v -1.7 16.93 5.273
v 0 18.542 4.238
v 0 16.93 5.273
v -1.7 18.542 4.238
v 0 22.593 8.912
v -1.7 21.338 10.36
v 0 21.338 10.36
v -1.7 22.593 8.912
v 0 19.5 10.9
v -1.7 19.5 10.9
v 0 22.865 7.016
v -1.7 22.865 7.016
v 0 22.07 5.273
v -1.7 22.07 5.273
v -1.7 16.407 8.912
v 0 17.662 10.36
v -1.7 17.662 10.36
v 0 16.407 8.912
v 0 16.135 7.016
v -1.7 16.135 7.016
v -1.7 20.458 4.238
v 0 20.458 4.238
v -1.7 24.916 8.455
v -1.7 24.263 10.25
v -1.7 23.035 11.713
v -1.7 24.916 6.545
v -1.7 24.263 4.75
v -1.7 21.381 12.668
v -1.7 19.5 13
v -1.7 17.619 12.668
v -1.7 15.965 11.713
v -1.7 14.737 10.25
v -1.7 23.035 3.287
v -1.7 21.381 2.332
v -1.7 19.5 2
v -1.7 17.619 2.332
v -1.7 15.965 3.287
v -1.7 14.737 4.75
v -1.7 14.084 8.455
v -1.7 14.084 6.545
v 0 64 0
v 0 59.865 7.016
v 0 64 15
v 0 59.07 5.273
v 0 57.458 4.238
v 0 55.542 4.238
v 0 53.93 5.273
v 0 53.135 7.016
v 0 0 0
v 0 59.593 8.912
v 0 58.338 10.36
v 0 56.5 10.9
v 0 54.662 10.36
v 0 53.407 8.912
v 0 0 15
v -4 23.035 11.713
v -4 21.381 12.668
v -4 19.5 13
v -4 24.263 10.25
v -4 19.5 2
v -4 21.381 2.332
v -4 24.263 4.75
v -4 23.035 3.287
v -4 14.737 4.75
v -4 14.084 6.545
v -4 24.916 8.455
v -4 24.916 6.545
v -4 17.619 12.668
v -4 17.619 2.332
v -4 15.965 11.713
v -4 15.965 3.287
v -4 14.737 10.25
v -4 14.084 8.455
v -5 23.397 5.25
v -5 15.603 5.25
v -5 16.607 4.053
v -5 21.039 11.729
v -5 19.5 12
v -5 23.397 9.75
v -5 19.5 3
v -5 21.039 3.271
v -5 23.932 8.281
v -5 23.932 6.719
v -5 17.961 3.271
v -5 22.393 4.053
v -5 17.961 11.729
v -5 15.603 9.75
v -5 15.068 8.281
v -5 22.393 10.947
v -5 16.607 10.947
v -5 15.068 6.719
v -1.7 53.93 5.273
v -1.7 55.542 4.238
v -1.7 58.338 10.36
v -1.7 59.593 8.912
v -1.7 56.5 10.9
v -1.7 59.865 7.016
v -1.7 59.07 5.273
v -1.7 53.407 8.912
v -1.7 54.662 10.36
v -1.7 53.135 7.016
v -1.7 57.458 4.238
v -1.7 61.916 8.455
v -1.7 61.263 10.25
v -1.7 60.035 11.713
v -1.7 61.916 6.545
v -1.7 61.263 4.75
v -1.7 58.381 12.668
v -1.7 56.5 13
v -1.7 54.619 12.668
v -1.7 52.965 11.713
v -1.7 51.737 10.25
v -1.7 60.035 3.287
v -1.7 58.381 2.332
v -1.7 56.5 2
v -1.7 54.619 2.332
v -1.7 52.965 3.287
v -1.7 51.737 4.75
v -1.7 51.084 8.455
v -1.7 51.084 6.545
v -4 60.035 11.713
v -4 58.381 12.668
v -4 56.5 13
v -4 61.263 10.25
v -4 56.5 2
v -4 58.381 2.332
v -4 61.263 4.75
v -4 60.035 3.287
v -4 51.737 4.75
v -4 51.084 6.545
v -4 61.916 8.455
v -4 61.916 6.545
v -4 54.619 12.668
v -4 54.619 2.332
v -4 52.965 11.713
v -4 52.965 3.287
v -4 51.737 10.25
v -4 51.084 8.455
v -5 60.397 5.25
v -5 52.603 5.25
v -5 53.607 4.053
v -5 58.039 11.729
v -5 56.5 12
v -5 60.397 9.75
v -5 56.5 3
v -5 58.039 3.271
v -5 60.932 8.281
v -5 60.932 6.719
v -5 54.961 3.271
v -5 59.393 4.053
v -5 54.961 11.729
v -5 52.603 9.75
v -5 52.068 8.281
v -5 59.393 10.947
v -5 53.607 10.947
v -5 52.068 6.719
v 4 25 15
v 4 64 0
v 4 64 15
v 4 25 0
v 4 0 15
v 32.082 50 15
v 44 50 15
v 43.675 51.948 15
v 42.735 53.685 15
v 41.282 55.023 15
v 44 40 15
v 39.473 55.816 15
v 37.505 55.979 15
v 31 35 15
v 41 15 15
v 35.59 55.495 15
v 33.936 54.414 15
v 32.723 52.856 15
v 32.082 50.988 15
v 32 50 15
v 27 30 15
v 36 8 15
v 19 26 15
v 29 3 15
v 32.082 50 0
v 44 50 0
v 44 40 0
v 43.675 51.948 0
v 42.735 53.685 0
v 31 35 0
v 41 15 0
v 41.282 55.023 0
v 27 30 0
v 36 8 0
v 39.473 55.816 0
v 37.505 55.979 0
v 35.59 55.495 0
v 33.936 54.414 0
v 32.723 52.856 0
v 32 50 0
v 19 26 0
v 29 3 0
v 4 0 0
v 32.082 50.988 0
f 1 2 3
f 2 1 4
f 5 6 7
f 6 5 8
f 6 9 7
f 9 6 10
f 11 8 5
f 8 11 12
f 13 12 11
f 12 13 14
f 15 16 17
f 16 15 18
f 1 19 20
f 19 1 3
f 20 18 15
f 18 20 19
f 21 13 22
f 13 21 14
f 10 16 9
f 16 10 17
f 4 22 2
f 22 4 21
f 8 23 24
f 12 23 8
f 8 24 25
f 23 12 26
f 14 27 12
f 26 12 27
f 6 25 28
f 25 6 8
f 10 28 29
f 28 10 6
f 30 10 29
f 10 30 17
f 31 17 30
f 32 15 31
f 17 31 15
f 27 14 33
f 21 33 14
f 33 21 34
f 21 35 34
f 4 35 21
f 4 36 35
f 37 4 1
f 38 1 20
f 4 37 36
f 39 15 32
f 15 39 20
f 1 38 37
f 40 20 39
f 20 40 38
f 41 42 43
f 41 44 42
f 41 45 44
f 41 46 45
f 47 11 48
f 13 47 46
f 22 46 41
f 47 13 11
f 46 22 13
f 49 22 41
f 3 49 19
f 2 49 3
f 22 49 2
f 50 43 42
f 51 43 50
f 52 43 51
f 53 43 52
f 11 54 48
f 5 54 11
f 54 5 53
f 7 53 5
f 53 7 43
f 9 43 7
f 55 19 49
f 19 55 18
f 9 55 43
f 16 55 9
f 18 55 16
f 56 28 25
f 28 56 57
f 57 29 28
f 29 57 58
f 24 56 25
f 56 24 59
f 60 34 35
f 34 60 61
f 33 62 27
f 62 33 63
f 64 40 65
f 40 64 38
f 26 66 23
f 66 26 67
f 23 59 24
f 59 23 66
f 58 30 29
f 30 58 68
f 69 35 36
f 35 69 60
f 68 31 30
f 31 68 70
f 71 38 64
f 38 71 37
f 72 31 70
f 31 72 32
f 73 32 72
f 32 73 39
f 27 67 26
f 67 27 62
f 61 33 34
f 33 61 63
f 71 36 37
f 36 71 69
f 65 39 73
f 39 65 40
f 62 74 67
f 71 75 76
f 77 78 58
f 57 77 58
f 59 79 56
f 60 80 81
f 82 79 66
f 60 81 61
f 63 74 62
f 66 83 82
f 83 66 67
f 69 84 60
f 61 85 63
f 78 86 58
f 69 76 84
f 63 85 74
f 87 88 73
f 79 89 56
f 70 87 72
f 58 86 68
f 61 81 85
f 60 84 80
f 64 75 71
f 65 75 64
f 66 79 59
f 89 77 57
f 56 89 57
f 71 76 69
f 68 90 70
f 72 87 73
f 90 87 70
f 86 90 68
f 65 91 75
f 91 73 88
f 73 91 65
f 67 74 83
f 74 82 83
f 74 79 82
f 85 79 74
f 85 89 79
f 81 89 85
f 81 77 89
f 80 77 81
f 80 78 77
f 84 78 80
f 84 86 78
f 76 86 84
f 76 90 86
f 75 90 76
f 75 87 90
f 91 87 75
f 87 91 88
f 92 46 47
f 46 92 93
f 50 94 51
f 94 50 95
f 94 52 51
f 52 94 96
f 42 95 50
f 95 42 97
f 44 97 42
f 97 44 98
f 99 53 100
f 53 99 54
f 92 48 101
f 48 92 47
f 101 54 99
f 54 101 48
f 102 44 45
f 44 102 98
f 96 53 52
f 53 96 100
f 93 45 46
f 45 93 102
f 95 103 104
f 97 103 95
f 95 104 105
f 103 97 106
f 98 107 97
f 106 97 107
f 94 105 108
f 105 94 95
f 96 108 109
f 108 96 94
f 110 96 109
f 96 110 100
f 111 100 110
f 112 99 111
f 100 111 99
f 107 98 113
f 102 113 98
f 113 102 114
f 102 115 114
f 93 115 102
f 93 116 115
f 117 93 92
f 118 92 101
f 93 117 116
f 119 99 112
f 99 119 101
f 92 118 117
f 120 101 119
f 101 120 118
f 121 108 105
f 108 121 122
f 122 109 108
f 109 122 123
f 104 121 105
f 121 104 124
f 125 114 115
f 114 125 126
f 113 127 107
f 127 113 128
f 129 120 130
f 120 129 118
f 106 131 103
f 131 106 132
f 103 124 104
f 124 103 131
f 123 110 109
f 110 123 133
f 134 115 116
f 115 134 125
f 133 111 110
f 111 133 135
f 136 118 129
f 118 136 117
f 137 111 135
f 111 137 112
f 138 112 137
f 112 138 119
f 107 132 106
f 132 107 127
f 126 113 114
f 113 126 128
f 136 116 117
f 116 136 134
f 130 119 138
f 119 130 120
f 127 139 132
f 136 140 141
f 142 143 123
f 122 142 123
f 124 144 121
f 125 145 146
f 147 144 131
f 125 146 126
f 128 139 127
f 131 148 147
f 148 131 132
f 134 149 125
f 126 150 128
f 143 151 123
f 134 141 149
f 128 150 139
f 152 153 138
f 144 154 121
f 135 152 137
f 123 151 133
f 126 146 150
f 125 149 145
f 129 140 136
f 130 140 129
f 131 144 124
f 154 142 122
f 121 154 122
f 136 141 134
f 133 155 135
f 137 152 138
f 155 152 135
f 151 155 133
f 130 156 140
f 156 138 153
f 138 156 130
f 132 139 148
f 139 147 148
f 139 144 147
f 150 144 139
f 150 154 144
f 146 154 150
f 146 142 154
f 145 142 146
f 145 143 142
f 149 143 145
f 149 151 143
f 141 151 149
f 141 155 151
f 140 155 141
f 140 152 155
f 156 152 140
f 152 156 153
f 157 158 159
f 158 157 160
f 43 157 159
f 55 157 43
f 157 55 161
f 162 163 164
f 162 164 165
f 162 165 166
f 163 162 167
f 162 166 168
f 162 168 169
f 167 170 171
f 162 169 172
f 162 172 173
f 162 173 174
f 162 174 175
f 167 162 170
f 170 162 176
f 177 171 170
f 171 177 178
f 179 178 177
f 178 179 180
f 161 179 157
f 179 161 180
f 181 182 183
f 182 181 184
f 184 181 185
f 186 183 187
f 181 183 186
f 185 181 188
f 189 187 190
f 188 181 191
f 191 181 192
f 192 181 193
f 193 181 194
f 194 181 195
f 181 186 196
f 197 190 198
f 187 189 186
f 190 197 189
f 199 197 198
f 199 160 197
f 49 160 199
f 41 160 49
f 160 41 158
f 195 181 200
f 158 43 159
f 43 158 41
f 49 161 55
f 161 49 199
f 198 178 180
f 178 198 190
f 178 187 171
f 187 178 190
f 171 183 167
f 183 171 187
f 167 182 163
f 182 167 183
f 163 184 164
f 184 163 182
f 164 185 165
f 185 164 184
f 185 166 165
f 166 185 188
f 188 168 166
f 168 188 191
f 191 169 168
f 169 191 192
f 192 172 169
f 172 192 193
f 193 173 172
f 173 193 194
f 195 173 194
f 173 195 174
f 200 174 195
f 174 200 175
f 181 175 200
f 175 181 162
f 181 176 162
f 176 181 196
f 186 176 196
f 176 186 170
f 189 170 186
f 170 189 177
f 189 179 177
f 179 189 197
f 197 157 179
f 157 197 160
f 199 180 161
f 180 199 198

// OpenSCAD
// Hooks for garage shelving
// by sabertail@physicsdog.org
//
// The failure mode I've observed is the "mushrooms" that lock into the
// shelving breaking off. They and the rest of the "mount" should be printed
// with 100% infill for maximum strength. The print should have the top of
// the "mushrooms" perpendicular to the layers, so they don't delaminate off.
// This means they will need supports.


width_back = 15;
thick_back = 4;
height_back = 64;


module mushroom() {
  h_total = 5;
  h_cap = 3.3;
  h_base = h_total - h_cap;
  
  d_cap = 11;
  d_base = 6.8;
  
  h_bevel = 1;
  r_bevel = 2;
  
  h_cap_unbeveled = h_cap - h_bevel;
  
  cylinder(d=d_base, h=h_base, center=false);
  translate([0,0,h_base])
    cylinder(d=d_cap, h=h_cap_unbeveled, center=false);
  translate([0,0,h_base + h_cap_unbeveled])
    cylinder(d1=d_cap, d2=d_cap - r_bevel, h=h_bevel, center=false);
};


module mount() {
  cube([thick_back, height_back, width_back]);

  n_mushroom = 2;
  mushroom_spacing = 37;
  extra_offset = 6;
  mushroom_offset = 0.5*(height_back - (n_mushroom-1)*mushroom_spacing) + extra_offset;
  for(i = [0:1:(n_mushroom-1)]) {
    translate([0, mushroom_offset + i*mushroom_spacing, 0.5*width_back]) rotate([0,-90,0]) mushroom();
  }
};


module hook() {
  points = [
    [ 0,  0],
    [25,  3],
    [32,  8],
    [37, 15],
    [40, 40],
    [40, 50],
    [28, 50],
    [27, 35],
    [23, 30],
    [15, 26],
    [ 0, 25],
    [ 0,  0],
  ];
  i_top_out = 5;
  i_top_in = 6;
  top_center = 0.5*(points[i_top_out] + points[i_top_in]);
  top_d = (points[i_top_out] - points[i_top_in])[0];
  linear_extrude(width_back) union() {
    polygon(points);
    translate(top_center) circle(d=top_d);
  }
};


mount();
translate([thick_back,0,0]) hook();
